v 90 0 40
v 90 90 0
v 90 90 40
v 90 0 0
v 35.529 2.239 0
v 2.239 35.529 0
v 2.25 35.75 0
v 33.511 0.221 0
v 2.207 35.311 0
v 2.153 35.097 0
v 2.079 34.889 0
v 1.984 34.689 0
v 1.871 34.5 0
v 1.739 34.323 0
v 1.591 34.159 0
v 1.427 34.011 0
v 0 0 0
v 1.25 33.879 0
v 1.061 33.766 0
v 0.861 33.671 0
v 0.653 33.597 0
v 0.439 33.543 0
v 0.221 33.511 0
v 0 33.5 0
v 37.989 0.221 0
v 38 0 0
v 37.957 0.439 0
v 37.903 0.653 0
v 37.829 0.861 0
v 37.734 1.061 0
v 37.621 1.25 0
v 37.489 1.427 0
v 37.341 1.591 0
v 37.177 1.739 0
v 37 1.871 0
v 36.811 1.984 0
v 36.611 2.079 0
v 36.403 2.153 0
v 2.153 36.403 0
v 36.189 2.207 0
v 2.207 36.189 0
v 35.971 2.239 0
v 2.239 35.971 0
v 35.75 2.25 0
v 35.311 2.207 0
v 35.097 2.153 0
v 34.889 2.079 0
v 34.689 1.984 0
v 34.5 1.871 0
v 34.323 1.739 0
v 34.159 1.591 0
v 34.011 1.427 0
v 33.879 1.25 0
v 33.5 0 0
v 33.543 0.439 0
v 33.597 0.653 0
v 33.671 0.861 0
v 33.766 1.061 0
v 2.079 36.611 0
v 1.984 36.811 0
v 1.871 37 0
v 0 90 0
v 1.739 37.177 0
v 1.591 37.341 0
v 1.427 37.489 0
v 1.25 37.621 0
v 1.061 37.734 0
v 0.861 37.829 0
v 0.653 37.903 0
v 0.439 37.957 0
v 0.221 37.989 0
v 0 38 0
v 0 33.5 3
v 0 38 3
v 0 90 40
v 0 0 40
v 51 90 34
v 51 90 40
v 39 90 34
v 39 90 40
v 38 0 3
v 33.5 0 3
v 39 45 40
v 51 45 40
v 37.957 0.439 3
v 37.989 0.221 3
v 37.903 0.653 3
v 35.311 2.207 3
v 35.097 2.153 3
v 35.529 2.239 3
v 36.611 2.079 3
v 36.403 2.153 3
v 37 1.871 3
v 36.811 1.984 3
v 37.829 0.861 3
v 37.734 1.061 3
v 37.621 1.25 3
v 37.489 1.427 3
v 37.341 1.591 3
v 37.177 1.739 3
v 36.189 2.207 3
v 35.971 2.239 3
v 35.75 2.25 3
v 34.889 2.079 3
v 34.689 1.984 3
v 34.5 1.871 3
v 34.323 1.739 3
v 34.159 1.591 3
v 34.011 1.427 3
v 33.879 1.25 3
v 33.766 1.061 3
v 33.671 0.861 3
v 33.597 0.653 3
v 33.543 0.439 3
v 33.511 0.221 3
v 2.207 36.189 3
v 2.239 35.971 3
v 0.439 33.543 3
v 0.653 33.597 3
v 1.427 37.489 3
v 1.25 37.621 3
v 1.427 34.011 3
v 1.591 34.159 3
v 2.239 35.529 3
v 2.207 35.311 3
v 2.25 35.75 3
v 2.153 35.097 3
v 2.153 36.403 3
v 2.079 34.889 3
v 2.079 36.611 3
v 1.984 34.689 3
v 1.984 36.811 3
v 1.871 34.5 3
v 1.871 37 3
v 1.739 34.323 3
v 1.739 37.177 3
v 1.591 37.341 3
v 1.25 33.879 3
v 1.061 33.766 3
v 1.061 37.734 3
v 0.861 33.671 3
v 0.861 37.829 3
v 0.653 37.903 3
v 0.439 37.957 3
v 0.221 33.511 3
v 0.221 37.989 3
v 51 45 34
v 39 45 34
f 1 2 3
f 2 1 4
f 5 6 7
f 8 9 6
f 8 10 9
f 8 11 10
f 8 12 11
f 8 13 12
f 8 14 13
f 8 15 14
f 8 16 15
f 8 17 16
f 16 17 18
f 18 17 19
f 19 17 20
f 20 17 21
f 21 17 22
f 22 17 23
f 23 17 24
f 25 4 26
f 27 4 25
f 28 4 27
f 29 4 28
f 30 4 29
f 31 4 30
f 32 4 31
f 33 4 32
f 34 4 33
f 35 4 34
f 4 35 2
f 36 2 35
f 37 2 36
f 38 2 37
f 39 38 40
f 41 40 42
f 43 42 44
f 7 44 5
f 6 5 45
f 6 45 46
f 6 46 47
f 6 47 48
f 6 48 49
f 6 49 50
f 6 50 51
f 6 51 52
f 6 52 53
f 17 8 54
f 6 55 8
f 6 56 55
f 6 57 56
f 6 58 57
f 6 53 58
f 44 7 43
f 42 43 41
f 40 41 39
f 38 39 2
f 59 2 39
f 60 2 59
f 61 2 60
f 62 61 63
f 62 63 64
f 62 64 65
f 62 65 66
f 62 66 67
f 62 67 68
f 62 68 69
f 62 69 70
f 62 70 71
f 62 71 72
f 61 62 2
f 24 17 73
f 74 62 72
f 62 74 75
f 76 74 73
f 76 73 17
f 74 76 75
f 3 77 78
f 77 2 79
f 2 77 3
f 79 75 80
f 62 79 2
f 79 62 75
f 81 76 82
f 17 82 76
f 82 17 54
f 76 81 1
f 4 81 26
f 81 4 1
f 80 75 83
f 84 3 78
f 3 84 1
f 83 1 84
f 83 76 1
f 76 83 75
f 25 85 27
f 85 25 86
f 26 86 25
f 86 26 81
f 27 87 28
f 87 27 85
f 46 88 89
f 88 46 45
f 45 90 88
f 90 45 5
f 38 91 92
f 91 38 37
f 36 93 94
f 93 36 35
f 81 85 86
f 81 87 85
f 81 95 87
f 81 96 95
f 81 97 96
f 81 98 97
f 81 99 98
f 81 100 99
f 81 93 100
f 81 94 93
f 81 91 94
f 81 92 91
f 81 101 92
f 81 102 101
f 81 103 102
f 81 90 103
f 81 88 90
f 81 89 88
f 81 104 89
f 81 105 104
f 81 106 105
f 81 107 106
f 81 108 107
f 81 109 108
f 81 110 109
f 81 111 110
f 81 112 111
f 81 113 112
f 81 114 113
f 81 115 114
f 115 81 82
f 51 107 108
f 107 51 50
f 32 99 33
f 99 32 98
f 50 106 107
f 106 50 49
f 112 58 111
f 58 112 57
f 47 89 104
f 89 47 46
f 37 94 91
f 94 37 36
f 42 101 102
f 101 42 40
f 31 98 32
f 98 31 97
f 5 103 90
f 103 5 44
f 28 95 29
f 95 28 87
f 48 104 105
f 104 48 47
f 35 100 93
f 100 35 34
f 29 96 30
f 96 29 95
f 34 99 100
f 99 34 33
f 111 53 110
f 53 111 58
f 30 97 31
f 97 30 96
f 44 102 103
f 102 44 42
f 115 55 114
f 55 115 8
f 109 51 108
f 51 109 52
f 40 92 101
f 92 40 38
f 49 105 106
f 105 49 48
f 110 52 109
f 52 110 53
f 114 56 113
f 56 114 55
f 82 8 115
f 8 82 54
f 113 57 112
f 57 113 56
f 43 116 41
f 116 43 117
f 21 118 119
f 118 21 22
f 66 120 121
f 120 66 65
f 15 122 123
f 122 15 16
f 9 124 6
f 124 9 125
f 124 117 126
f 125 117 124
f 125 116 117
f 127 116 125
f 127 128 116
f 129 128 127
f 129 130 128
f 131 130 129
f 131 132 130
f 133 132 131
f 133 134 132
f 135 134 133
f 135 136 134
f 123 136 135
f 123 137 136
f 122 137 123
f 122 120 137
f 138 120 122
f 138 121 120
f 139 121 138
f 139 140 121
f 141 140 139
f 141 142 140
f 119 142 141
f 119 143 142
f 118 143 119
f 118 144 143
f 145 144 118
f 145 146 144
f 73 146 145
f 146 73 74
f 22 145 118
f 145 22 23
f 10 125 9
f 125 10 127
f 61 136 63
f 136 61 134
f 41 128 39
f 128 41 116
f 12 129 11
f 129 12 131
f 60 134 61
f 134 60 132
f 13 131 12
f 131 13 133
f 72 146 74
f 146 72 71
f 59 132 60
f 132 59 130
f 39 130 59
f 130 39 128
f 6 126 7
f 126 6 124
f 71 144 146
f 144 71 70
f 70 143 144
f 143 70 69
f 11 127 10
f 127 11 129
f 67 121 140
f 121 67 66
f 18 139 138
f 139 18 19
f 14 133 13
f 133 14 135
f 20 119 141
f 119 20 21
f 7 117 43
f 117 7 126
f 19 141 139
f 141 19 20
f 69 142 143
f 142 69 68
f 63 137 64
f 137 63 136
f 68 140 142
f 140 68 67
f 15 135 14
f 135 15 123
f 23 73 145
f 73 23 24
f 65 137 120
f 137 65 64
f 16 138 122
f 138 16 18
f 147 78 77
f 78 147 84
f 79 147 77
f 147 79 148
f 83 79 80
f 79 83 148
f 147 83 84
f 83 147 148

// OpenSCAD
// Housing for a DIY magnetic stirrer built from an 80 mm PC case fan
// Printed upside down: top plate on the bed, box open at the top.

$fn = 64;

// ---- Dimensions (mm) ----
top_t      = 2;    // top plate thickness (z = 0 to 2)
wall_t     = 2.5;  // wall thickness
box_h      = 40;   // total height of box walls (open top at z = 40)
outer_x    = 90;   // outer size along X
outer_y    = 90;   // outer size along Y
screw_n    = 4;    // number of M4 screw holes
screw_d    = 4.5;  // screw hole diameter
screw_pitch = 71.5;// square pitch of screw holes (X and Y)
cable_w    = 12;   // width of power cable notch
cable_reach = 8;   // notch depth from open edge (z = 32 to 40)

// ---- Model ----
difference() {
    // Outer box
    union() {
        cube([outer_x, outer_y, top_t]);           // top plate
        cube([outer_x, outer_y, box_h]);           // walls (overlaps plate)
    }

    // M4 screw holes through the top plate
    for (i = [0 : screw_n - 1])
        rotate([0, 0, 90 * i])
            translate([screw_pitch / 2, 0, -1])
                cylinder(d = screw_d, h = top_t + 2, $fn = 64);

    // Power cable notch in one wall
    translate([outer_x / 2 - cable_w / 2, outer_y / 2, top_t + box_h - cable_reach])
        cube([cable_w, outer_y, cable_reach + 1]);
}
